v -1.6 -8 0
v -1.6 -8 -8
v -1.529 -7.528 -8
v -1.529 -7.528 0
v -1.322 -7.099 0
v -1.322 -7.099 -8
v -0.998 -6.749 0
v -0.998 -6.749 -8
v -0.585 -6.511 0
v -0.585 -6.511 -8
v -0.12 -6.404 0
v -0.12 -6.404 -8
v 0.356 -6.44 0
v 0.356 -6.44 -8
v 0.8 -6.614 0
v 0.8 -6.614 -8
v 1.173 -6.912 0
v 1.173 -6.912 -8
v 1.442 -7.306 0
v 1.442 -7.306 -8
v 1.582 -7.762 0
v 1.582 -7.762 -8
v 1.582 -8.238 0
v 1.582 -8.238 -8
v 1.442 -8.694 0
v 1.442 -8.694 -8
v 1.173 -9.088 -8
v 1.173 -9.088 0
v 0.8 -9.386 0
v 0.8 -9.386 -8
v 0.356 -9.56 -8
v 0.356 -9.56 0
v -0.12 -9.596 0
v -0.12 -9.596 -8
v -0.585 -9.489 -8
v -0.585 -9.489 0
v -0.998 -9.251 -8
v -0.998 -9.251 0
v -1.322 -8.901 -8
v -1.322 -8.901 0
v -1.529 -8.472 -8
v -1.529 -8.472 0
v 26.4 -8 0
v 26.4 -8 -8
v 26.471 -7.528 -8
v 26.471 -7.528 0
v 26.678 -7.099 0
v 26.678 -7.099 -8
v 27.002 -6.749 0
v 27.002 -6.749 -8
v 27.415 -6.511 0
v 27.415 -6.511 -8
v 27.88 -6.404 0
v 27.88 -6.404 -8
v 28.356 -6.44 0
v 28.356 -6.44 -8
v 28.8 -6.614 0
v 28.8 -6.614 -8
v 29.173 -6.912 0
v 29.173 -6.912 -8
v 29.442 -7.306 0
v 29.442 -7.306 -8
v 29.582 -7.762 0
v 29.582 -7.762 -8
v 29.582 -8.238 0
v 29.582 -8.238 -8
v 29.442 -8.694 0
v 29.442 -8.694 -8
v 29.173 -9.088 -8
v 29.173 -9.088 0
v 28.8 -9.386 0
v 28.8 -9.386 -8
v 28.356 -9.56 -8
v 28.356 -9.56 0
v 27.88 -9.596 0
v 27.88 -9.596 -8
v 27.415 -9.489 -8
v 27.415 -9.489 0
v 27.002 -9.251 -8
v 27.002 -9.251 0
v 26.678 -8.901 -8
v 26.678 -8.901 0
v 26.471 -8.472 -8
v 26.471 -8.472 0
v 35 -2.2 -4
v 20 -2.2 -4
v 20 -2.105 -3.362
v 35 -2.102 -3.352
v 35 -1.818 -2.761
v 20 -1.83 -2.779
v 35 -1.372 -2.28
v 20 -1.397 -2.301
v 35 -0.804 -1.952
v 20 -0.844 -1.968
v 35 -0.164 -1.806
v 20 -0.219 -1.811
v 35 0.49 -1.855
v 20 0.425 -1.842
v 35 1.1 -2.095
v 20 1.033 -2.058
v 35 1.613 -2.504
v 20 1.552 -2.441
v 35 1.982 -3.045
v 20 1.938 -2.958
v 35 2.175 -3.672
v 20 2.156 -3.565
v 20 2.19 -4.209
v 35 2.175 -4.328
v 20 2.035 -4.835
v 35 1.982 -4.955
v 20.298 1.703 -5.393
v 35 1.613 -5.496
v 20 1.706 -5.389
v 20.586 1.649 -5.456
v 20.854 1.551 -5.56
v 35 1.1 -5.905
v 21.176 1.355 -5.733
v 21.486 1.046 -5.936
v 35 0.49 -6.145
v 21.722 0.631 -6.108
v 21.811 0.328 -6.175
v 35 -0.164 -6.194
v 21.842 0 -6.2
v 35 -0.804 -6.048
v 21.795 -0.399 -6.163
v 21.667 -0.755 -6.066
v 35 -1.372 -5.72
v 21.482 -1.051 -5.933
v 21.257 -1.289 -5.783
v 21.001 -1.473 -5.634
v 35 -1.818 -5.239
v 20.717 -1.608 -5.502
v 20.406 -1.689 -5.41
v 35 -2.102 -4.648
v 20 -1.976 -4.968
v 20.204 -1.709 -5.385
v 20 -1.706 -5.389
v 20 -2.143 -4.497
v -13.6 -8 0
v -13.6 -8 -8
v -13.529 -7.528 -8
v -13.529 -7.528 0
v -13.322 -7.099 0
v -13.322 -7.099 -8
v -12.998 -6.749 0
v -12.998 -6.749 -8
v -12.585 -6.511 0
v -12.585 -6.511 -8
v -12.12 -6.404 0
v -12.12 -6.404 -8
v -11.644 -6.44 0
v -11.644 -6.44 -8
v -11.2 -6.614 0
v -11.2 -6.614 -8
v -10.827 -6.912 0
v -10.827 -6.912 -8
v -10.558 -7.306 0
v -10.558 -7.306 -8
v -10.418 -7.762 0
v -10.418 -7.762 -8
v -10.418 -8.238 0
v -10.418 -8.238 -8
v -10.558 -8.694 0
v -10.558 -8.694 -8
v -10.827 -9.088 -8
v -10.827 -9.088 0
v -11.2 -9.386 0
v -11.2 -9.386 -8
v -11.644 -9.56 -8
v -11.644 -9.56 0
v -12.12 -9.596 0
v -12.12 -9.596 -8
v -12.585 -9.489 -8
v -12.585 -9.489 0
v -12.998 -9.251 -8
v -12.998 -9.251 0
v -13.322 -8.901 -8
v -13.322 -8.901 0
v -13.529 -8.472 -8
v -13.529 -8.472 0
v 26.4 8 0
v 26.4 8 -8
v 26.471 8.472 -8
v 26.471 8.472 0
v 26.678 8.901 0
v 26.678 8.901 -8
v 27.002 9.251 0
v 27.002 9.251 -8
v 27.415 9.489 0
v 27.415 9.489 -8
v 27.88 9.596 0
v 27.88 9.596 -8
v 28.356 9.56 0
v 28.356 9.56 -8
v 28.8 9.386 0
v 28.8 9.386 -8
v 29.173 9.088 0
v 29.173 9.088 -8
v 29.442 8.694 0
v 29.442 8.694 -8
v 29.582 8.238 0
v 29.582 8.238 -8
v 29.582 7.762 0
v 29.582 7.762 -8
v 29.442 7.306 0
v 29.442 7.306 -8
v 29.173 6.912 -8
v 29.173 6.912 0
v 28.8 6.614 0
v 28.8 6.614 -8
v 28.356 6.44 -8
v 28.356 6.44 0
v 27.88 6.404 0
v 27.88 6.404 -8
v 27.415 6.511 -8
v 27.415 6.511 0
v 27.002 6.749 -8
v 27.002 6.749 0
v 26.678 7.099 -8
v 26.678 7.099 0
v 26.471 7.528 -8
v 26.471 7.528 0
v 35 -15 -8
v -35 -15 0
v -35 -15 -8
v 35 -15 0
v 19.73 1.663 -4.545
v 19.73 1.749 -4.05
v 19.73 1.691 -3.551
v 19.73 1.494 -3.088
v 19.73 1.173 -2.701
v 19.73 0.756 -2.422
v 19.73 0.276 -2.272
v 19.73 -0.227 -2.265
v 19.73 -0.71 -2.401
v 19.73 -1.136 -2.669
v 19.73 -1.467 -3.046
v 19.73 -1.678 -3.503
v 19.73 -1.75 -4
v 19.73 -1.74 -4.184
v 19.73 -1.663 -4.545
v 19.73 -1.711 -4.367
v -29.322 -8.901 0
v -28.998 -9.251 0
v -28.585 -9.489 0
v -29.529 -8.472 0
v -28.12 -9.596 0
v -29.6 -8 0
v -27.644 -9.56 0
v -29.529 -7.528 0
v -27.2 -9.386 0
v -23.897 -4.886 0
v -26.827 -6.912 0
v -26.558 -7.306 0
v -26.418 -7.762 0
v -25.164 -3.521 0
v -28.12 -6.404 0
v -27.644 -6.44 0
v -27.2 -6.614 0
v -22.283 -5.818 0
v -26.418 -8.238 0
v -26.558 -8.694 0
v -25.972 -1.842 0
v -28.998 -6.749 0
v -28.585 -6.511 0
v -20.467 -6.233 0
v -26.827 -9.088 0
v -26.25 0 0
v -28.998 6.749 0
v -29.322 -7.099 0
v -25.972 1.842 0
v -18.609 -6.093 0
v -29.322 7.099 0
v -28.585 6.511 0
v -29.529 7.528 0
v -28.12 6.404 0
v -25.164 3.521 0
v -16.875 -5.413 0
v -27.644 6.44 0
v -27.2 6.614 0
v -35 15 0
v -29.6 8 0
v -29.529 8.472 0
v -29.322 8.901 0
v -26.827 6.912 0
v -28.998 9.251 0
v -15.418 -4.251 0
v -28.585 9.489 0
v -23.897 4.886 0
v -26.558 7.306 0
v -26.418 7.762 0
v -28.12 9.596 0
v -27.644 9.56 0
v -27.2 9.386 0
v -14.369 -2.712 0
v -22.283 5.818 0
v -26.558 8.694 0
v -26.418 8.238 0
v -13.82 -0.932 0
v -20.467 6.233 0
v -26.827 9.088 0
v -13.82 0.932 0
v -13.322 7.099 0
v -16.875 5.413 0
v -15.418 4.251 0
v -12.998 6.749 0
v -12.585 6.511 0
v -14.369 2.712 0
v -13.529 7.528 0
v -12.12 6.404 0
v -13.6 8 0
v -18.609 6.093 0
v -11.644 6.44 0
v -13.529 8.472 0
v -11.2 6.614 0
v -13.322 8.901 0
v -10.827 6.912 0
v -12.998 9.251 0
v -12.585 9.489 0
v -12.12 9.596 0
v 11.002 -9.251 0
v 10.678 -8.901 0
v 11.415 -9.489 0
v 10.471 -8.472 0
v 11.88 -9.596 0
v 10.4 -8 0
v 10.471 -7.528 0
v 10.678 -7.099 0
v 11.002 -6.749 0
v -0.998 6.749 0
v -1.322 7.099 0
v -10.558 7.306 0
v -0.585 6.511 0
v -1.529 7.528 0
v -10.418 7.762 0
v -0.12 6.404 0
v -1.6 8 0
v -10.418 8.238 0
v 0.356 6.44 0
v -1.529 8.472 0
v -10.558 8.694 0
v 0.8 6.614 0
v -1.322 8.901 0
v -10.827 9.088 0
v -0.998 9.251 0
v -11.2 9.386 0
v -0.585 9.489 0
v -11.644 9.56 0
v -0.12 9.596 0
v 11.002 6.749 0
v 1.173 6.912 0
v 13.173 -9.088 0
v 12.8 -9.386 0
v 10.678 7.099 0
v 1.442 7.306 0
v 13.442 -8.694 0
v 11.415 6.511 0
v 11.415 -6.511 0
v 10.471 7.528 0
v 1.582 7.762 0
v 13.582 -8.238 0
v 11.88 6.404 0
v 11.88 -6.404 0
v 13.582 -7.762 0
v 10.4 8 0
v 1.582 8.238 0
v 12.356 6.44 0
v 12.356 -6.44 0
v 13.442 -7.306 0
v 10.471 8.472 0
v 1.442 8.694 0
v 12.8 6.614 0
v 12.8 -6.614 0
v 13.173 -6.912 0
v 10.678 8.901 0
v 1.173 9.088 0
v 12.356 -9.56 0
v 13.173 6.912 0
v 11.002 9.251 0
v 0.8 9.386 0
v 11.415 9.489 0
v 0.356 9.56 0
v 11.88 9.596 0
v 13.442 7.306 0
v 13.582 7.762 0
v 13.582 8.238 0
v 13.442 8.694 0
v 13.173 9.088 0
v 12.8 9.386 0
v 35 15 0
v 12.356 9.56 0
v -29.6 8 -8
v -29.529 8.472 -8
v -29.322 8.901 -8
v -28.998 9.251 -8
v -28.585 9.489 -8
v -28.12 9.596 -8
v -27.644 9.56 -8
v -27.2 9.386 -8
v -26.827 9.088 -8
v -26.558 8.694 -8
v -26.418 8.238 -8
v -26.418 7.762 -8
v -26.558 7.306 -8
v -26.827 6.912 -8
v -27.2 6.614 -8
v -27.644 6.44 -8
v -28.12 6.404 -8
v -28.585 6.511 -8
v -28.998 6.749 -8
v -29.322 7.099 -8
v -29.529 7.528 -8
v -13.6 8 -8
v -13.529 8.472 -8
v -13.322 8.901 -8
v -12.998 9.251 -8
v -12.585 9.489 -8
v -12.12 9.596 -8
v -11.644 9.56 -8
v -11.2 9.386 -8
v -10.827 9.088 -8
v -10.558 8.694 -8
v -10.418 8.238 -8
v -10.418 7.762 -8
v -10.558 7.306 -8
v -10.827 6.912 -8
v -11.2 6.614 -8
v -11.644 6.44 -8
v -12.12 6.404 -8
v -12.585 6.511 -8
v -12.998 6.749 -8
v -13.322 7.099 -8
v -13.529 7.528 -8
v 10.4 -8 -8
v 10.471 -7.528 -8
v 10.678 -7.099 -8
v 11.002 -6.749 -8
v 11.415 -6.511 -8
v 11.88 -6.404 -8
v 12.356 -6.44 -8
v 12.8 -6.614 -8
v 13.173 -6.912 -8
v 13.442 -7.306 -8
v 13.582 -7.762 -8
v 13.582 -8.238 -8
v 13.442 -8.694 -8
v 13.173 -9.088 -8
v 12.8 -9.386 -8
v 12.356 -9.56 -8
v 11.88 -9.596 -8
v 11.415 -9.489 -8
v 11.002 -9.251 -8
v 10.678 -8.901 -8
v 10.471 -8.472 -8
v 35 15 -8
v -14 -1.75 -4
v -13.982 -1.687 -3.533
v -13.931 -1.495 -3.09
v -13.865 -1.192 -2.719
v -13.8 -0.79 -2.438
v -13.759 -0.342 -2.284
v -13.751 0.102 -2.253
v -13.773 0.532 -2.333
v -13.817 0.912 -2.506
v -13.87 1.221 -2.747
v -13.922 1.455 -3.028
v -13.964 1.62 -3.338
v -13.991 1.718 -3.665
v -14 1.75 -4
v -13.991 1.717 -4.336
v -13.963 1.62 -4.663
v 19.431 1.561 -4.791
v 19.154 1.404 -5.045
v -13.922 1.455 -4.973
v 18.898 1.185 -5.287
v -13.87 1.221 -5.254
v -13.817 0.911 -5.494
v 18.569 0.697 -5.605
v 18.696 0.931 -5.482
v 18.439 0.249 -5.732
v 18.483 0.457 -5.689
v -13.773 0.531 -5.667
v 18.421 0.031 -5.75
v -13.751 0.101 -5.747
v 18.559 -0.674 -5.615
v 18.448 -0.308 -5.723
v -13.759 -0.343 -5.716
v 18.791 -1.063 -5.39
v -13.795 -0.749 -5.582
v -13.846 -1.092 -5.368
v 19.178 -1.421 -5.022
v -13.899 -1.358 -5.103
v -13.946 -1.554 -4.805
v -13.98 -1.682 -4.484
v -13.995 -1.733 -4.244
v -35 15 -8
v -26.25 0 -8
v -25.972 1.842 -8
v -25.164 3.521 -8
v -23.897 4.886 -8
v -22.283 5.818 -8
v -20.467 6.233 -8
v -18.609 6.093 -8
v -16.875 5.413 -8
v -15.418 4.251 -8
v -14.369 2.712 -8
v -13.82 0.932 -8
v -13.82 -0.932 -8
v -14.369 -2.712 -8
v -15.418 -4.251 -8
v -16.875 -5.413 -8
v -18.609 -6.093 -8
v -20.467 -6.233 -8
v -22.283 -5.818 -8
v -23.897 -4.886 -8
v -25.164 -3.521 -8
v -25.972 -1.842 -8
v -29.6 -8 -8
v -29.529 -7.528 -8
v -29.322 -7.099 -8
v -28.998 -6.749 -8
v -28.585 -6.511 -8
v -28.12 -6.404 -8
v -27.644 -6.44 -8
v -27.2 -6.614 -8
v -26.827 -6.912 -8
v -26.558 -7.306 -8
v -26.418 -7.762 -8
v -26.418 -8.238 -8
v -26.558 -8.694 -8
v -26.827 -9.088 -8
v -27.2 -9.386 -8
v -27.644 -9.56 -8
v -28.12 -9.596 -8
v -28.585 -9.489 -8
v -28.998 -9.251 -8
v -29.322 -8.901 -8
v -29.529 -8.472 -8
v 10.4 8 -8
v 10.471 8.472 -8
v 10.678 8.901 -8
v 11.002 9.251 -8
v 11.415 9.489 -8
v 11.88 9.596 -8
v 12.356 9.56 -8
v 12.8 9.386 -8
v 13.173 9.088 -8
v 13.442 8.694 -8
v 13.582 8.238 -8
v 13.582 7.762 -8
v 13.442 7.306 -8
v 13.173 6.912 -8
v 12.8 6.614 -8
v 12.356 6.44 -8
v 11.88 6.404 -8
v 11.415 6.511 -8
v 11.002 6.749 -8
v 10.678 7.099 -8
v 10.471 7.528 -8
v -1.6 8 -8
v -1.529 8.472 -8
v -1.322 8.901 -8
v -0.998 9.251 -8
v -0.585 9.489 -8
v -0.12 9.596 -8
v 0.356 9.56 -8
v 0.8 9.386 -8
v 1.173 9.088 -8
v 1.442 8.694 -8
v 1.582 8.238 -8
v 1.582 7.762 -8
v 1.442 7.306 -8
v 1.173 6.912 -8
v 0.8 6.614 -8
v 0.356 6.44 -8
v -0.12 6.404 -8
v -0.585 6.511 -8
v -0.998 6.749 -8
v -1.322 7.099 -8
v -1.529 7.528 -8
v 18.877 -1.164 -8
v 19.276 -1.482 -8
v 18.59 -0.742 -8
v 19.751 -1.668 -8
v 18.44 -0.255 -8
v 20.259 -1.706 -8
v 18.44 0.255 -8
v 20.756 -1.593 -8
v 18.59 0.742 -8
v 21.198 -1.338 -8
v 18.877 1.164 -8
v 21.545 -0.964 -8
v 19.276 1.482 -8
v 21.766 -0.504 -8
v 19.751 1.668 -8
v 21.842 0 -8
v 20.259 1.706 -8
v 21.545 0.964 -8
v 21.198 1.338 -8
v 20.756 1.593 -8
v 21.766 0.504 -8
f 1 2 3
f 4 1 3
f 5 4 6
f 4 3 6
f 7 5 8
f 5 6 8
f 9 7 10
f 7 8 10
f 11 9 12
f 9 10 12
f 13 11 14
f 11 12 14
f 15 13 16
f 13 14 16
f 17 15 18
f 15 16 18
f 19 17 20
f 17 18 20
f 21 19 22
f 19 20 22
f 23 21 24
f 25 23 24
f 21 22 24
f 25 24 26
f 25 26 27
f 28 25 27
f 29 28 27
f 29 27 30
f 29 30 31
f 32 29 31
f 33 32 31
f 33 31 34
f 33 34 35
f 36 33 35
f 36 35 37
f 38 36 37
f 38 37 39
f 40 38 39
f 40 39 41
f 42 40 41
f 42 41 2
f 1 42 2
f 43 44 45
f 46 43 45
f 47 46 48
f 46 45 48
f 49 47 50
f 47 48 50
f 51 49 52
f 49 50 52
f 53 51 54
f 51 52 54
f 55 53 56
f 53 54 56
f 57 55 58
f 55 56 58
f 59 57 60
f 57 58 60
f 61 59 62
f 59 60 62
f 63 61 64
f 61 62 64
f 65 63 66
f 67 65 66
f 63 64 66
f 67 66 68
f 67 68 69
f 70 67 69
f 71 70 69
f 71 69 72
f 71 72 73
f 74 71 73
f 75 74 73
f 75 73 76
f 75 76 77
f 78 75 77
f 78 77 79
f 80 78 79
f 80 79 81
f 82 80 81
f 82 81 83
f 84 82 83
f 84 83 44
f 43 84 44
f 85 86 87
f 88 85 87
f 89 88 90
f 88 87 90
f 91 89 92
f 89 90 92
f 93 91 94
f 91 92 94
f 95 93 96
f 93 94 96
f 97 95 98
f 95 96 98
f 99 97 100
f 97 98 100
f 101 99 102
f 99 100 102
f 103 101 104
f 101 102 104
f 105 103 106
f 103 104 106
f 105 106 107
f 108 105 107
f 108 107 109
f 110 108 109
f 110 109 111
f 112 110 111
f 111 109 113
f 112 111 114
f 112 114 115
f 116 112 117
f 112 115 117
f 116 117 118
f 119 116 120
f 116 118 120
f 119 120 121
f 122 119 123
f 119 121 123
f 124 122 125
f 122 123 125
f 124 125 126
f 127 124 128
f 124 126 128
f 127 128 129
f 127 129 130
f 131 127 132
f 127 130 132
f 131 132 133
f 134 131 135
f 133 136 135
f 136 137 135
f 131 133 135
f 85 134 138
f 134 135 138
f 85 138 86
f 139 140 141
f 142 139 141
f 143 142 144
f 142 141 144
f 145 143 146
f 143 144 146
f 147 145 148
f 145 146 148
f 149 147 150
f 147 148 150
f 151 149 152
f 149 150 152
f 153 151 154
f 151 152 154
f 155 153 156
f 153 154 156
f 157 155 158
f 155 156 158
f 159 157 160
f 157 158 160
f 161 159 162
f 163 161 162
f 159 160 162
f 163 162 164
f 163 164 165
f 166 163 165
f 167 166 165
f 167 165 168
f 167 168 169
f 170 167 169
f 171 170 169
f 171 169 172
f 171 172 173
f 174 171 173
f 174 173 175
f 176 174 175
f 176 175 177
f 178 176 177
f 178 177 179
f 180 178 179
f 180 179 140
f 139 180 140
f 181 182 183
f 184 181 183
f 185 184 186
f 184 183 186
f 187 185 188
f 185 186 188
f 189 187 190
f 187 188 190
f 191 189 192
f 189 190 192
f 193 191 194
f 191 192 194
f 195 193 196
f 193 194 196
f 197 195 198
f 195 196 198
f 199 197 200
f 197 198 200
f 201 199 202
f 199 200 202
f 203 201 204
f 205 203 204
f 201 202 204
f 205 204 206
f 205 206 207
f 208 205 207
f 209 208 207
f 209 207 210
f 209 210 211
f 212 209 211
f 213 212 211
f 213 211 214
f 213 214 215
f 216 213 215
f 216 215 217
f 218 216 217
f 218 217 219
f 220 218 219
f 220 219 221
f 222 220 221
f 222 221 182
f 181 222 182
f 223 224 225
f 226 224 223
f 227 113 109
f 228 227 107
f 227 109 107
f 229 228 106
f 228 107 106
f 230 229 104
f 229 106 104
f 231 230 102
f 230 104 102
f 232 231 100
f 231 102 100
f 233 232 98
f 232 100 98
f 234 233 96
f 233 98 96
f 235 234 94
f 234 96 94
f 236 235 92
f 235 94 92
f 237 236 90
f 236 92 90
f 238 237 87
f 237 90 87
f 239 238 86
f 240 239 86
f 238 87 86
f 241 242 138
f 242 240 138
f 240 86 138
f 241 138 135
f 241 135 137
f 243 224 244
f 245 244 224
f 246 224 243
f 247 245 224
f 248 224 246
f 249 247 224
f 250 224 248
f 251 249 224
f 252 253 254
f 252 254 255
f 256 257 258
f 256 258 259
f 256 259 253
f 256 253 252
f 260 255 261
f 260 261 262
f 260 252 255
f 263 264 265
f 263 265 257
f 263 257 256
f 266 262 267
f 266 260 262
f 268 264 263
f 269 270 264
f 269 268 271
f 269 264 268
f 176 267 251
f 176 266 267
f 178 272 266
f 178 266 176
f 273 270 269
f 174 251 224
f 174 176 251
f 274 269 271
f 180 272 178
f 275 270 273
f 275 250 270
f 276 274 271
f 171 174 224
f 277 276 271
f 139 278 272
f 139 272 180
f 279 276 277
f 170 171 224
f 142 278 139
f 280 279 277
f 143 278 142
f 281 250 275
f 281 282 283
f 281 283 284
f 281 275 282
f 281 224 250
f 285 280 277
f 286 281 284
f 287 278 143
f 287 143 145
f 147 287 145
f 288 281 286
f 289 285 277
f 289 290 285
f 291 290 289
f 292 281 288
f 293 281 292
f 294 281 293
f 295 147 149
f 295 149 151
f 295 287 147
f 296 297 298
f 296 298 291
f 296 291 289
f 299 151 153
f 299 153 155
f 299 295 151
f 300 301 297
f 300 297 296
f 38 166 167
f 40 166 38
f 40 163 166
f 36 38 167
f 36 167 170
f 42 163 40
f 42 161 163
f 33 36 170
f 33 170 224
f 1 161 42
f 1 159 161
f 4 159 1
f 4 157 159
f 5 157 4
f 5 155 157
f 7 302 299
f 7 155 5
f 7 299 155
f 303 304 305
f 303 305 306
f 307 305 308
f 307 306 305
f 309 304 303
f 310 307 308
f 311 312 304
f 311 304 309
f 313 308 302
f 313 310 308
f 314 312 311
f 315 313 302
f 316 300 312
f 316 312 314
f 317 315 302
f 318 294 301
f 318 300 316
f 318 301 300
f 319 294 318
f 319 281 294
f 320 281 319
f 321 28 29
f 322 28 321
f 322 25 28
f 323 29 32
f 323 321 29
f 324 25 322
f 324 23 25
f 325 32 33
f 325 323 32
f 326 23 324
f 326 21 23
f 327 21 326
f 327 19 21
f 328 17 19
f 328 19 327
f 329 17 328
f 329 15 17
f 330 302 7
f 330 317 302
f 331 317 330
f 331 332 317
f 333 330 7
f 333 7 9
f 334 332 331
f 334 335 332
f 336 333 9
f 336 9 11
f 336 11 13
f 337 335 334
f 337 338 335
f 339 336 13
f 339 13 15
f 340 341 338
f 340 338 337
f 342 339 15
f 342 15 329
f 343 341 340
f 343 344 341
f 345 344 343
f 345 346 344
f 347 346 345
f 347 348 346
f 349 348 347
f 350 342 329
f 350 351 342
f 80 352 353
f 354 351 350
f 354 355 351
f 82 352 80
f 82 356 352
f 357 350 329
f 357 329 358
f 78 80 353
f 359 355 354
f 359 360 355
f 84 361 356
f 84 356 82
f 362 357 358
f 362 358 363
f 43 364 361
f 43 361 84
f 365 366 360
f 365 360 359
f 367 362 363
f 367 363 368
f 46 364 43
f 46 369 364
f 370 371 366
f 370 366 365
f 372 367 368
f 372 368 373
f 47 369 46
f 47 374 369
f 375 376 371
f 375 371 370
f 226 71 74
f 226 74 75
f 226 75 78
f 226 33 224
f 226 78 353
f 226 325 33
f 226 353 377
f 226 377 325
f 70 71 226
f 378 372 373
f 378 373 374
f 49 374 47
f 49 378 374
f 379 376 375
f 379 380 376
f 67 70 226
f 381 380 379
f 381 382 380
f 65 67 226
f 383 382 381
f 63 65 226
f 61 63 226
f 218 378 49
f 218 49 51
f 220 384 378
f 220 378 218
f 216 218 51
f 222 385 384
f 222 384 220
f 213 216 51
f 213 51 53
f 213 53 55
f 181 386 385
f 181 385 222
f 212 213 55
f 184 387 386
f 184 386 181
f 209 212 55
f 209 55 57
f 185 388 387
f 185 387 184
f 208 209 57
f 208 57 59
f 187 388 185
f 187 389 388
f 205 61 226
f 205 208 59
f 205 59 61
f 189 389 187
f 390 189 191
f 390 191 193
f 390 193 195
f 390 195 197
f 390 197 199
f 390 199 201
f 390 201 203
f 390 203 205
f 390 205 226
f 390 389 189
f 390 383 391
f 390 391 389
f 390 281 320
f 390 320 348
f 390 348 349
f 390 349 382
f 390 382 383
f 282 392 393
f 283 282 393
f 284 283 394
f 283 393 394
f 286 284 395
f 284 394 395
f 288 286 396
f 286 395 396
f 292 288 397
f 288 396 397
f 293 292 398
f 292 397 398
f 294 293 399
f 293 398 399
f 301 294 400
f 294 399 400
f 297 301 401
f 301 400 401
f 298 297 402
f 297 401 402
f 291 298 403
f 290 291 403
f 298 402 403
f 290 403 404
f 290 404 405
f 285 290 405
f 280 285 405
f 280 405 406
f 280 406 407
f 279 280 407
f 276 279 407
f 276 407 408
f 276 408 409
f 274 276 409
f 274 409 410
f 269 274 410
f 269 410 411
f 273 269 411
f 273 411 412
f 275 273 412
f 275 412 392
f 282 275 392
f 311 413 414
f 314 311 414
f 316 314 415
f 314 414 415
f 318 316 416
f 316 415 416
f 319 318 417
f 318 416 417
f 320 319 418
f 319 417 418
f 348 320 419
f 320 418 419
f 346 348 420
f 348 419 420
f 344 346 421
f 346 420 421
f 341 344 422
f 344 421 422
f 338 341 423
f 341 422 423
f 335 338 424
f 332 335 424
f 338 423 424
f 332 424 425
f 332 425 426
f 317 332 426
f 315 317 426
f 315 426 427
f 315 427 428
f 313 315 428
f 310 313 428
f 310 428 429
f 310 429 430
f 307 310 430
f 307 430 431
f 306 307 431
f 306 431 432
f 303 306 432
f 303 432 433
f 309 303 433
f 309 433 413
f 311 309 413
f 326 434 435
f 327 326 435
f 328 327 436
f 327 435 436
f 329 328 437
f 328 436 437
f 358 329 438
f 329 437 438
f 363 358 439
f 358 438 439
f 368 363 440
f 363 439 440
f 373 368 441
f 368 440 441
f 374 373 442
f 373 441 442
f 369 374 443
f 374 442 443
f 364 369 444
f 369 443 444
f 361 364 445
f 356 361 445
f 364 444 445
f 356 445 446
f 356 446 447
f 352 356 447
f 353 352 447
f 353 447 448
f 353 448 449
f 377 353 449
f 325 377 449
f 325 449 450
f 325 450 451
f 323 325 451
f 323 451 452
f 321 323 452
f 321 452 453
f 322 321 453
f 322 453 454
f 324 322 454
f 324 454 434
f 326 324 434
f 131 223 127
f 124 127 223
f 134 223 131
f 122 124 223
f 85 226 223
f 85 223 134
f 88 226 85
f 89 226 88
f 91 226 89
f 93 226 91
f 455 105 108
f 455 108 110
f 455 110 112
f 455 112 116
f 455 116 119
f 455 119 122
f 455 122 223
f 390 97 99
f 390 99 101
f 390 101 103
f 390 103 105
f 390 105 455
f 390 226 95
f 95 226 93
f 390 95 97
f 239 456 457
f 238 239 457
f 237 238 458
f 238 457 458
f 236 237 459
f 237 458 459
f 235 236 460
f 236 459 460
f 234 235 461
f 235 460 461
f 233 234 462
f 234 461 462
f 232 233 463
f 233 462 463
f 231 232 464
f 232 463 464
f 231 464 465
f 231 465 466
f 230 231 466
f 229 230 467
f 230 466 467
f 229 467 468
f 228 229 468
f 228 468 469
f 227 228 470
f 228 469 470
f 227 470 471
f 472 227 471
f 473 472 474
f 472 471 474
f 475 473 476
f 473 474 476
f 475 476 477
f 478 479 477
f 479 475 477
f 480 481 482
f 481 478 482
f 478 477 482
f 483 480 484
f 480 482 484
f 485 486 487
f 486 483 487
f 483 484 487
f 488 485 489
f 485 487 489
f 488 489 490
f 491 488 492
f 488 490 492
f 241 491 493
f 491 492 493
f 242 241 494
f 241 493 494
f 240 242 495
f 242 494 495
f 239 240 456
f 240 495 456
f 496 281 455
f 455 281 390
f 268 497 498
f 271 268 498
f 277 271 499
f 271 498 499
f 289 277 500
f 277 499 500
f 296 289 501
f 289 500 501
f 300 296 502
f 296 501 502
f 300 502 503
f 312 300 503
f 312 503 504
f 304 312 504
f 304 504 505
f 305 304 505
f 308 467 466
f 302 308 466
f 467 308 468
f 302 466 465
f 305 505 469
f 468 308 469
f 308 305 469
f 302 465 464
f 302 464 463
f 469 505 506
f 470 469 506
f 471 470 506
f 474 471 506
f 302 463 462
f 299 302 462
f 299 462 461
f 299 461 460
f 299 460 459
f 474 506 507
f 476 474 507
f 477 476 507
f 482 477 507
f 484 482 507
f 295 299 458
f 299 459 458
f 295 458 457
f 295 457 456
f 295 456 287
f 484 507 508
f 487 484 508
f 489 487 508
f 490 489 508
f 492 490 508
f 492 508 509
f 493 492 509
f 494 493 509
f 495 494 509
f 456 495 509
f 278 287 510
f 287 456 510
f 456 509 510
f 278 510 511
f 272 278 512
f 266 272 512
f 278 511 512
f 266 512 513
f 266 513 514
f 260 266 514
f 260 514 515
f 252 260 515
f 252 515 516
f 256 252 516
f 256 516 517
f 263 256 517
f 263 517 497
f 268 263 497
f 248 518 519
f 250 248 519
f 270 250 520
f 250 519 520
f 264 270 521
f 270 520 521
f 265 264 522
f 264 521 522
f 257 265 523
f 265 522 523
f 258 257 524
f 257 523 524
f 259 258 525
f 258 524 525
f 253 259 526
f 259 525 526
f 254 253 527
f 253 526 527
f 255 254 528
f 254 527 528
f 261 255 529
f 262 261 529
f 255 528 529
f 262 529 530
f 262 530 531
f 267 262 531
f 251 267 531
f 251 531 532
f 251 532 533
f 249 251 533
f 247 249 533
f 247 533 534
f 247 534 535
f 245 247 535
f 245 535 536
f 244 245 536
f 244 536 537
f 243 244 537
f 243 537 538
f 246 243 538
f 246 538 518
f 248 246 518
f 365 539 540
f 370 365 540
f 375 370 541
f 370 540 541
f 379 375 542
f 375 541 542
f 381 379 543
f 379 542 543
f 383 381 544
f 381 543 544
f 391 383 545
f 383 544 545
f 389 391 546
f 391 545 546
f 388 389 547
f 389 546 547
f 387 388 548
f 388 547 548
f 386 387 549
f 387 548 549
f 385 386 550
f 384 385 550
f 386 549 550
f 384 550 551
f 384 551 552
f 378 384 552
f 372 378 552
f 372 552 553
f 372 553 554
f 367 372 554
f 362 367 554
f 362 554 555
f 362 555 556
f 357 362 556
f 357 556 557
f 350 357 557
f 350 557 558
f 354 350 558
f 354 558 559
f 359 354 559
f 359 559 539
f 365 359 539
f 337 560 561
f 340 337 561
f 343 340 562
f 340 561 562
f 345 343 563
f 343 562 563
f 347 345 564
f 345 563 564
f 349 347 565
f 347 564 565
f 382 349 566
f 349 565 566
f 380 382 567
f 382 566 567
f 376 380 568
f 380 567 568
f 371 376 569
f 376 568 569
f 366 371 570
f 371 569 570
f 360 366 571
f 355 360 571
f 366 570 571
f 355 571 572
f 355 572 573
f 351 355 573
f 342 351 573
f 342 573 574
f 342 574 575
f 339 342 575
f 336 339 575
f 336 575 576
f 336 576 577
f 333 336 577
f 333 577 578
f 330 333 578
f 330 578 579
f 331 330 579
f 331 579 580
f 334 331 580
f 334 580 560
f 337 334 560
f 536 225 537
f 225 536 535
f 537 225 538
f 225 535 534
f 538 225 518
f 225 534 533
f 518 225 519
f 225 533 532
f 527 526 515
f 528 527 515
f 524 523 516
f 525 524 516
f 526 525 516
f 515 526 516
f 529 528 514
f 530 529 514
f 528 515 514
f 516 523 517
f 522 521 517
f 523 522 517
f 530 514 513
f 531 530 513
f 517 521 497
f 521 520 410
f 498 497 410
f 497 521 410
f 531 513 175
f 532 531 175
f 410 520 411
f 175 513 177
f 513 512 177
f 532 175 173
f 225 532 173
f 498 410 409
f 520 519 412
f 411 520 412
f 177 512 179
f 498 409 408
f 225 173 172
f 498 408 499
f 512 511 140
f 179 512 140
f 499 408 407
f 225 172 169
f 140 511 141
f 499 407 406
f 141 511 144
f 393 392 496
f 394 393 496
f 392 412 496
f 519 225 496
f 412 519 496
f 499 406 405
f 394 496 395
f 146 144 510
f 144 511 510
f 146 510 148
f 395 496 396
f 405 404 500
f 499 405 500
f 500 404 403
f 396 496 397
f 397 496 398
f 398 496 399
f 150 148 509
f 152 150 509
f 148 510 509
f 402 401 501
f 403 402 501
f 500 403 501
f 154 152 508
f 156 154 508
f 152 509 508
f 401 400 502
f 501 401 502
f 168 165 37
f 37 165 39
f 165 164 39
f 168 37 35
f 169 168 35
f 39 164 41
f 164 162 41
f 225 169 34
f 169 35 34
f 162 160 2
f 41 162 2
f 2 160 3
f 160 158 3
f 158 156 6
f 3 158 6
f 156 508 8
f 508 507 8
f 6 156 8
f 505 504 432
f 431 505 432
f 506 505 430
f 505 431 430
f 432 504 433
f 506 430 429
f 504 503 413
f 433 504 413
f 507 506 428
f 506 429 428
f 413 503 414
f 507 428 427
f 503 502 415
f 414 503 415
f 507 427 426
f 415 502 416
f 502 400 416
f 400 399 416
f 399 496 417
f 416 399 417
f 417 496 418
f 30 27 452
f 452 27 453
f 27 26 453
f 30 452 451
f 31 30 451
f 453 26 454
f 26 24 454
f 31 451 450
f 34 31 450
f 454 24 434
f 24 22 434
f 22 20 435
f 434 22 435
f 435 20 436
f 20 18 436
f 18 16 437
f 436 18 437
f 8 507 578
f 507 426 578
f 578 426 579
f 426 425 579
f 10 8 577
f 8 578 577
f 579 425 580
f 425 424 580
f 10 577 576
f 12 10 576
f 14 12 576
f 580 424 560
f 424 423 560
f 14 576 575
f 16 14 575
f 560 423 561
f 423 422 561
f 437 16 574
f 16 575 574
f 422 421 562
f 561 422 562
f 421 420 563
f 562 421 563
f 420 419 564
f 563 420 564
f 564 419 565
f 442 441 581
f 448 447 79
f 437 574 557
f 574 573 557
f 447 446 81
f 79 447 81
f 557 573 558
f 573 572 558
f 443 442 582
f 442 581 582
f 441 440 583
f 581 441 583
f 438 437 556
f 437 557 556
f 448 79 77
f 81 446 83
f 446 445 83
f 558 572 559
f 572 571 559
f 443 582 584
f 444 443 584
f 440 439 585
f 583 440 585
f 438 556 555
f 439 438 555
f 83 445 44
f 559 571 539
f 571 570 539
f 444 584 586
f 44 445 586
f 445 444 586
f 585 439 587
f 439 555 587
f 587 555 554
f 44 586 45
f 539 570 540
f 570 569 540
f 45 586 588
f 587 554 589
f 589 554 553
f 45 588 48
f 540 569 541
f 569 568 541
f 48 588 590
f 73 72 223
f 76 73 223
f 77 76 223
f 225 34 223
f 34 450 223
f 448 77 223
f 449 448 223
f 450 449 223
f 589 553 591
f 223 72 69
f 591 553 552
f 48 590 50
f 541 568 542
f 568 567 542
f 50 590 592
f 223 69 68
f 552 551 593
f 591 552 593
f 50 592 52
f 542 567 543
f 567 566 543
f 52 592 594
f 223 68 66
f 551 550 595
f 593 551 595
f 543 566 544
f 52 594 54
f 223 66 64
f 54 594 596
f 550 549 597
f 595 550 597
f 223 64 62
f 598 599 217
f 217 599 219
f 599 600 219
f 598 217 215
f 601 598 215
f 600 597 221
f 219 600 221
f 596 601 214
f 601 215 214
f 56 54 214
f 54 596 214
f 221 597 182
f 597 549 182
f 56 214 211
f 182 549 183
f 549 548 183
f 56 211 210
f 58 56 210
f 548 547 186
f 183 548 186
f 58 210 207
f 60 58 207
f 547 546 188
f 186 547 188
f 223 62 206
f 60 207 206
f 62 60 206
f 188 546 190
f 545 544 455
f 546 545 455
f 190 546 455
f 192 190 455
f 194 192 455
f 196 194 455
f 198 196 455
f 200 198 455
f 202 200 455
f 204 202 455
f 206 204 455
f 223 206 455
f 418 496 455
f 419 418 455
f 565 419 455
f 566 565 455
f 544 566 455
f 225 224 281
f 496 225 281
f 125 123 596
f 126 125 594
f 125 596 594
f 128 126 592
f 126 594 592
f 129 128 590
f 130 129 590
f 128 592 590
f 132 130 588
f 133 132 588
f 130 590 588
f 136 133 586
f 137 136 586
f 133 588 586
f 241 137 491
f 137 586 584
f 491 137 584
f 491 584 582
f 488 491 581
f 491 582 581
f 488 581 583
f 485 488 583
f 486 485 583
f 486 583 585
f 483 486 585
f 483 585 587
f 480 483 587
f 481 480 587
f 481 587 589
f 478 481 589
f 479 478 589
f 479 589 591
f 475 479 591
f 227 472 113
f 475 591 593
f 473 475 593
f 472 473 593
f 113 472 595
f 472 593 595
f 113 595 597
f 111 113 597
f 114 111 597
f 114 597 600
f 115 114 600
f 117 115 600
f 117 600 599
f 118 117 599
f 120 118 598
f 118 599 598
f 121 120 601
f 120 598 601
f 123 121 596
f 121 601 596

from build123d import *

# Parameters (mm, degrees)
F0_W     = 70
F0_H     = 30
F1_DEPTH = 8
F2_D     = 3.2
F3_D     = 12.5
F5_D     = 3.5
F5_DEPTH = 50
F5_TIP   = 1.0515060833
F6_D     = 4.4
F6_DEPTH = 15
F6_TIP   = 1.3218933619
F7_R     = 1.7108756352
F8_DEPTH = 3.456151576


with BuildPart() as f1:
    # F0 (on Top) → F1 (new body)
    with BuildSketch(Plane.XY):
        Rectangle(F0_W, F0_H)
    extrude(amount=-F1_DEPTH)

    # F2 (through all)
    with Locations(Plane.XY):
        with Locations((-28, 8), (-12, 8), (-28, -8), (-12, -8), (0, 8), (0, -8), (12, 8), (12, -8), (28, 8), (28, -8)):
            Hole(F2_D / 2)

    # F3 (through all)
    with Locations(Plane.XY):
        with Locations((-20, 0)):
            Hole(F3_D / 2)

    # F5
    with Locations(Plane.YZ.offset(35)):
        with Locations((0, -4)):
            Hole(F5_D / 2, depth=F5_DEPTH)
            with Locations((0, 0, -(F5_DEPTH + F5_TIP / 2))):  # 118° drill point
                Cone(0, F5_D / 2, F5_TIP, mode=Mode.SUBTRACT)

    # F6
    with Locations(Plane.YZ.offset(35)):
        with Locations((0, -4)):
            Hole(F6_D / 2, depth=F6_DEPTH)
            with Locations((0, 0, -(F6_DEPTH + F6_TIP / 2))):  # 118° drill point
                Cone(0, F6_D / 2, F6_TIP, mode=Mode.SUBTRACT)

    # F7 (on face) → F8 (cut, through all)
    with BuildSketch(Plane(origin=(0, 0, -8), x_dir=(1, 0, 0), z_dir=(0, 0, -1))):
        with Locations((20.1314277947, 0)):
            Circle(F7_R)
    extrude(amount=-F8_DEPTH, mode=Mode.SUBTRACT)


solid = f1.part
